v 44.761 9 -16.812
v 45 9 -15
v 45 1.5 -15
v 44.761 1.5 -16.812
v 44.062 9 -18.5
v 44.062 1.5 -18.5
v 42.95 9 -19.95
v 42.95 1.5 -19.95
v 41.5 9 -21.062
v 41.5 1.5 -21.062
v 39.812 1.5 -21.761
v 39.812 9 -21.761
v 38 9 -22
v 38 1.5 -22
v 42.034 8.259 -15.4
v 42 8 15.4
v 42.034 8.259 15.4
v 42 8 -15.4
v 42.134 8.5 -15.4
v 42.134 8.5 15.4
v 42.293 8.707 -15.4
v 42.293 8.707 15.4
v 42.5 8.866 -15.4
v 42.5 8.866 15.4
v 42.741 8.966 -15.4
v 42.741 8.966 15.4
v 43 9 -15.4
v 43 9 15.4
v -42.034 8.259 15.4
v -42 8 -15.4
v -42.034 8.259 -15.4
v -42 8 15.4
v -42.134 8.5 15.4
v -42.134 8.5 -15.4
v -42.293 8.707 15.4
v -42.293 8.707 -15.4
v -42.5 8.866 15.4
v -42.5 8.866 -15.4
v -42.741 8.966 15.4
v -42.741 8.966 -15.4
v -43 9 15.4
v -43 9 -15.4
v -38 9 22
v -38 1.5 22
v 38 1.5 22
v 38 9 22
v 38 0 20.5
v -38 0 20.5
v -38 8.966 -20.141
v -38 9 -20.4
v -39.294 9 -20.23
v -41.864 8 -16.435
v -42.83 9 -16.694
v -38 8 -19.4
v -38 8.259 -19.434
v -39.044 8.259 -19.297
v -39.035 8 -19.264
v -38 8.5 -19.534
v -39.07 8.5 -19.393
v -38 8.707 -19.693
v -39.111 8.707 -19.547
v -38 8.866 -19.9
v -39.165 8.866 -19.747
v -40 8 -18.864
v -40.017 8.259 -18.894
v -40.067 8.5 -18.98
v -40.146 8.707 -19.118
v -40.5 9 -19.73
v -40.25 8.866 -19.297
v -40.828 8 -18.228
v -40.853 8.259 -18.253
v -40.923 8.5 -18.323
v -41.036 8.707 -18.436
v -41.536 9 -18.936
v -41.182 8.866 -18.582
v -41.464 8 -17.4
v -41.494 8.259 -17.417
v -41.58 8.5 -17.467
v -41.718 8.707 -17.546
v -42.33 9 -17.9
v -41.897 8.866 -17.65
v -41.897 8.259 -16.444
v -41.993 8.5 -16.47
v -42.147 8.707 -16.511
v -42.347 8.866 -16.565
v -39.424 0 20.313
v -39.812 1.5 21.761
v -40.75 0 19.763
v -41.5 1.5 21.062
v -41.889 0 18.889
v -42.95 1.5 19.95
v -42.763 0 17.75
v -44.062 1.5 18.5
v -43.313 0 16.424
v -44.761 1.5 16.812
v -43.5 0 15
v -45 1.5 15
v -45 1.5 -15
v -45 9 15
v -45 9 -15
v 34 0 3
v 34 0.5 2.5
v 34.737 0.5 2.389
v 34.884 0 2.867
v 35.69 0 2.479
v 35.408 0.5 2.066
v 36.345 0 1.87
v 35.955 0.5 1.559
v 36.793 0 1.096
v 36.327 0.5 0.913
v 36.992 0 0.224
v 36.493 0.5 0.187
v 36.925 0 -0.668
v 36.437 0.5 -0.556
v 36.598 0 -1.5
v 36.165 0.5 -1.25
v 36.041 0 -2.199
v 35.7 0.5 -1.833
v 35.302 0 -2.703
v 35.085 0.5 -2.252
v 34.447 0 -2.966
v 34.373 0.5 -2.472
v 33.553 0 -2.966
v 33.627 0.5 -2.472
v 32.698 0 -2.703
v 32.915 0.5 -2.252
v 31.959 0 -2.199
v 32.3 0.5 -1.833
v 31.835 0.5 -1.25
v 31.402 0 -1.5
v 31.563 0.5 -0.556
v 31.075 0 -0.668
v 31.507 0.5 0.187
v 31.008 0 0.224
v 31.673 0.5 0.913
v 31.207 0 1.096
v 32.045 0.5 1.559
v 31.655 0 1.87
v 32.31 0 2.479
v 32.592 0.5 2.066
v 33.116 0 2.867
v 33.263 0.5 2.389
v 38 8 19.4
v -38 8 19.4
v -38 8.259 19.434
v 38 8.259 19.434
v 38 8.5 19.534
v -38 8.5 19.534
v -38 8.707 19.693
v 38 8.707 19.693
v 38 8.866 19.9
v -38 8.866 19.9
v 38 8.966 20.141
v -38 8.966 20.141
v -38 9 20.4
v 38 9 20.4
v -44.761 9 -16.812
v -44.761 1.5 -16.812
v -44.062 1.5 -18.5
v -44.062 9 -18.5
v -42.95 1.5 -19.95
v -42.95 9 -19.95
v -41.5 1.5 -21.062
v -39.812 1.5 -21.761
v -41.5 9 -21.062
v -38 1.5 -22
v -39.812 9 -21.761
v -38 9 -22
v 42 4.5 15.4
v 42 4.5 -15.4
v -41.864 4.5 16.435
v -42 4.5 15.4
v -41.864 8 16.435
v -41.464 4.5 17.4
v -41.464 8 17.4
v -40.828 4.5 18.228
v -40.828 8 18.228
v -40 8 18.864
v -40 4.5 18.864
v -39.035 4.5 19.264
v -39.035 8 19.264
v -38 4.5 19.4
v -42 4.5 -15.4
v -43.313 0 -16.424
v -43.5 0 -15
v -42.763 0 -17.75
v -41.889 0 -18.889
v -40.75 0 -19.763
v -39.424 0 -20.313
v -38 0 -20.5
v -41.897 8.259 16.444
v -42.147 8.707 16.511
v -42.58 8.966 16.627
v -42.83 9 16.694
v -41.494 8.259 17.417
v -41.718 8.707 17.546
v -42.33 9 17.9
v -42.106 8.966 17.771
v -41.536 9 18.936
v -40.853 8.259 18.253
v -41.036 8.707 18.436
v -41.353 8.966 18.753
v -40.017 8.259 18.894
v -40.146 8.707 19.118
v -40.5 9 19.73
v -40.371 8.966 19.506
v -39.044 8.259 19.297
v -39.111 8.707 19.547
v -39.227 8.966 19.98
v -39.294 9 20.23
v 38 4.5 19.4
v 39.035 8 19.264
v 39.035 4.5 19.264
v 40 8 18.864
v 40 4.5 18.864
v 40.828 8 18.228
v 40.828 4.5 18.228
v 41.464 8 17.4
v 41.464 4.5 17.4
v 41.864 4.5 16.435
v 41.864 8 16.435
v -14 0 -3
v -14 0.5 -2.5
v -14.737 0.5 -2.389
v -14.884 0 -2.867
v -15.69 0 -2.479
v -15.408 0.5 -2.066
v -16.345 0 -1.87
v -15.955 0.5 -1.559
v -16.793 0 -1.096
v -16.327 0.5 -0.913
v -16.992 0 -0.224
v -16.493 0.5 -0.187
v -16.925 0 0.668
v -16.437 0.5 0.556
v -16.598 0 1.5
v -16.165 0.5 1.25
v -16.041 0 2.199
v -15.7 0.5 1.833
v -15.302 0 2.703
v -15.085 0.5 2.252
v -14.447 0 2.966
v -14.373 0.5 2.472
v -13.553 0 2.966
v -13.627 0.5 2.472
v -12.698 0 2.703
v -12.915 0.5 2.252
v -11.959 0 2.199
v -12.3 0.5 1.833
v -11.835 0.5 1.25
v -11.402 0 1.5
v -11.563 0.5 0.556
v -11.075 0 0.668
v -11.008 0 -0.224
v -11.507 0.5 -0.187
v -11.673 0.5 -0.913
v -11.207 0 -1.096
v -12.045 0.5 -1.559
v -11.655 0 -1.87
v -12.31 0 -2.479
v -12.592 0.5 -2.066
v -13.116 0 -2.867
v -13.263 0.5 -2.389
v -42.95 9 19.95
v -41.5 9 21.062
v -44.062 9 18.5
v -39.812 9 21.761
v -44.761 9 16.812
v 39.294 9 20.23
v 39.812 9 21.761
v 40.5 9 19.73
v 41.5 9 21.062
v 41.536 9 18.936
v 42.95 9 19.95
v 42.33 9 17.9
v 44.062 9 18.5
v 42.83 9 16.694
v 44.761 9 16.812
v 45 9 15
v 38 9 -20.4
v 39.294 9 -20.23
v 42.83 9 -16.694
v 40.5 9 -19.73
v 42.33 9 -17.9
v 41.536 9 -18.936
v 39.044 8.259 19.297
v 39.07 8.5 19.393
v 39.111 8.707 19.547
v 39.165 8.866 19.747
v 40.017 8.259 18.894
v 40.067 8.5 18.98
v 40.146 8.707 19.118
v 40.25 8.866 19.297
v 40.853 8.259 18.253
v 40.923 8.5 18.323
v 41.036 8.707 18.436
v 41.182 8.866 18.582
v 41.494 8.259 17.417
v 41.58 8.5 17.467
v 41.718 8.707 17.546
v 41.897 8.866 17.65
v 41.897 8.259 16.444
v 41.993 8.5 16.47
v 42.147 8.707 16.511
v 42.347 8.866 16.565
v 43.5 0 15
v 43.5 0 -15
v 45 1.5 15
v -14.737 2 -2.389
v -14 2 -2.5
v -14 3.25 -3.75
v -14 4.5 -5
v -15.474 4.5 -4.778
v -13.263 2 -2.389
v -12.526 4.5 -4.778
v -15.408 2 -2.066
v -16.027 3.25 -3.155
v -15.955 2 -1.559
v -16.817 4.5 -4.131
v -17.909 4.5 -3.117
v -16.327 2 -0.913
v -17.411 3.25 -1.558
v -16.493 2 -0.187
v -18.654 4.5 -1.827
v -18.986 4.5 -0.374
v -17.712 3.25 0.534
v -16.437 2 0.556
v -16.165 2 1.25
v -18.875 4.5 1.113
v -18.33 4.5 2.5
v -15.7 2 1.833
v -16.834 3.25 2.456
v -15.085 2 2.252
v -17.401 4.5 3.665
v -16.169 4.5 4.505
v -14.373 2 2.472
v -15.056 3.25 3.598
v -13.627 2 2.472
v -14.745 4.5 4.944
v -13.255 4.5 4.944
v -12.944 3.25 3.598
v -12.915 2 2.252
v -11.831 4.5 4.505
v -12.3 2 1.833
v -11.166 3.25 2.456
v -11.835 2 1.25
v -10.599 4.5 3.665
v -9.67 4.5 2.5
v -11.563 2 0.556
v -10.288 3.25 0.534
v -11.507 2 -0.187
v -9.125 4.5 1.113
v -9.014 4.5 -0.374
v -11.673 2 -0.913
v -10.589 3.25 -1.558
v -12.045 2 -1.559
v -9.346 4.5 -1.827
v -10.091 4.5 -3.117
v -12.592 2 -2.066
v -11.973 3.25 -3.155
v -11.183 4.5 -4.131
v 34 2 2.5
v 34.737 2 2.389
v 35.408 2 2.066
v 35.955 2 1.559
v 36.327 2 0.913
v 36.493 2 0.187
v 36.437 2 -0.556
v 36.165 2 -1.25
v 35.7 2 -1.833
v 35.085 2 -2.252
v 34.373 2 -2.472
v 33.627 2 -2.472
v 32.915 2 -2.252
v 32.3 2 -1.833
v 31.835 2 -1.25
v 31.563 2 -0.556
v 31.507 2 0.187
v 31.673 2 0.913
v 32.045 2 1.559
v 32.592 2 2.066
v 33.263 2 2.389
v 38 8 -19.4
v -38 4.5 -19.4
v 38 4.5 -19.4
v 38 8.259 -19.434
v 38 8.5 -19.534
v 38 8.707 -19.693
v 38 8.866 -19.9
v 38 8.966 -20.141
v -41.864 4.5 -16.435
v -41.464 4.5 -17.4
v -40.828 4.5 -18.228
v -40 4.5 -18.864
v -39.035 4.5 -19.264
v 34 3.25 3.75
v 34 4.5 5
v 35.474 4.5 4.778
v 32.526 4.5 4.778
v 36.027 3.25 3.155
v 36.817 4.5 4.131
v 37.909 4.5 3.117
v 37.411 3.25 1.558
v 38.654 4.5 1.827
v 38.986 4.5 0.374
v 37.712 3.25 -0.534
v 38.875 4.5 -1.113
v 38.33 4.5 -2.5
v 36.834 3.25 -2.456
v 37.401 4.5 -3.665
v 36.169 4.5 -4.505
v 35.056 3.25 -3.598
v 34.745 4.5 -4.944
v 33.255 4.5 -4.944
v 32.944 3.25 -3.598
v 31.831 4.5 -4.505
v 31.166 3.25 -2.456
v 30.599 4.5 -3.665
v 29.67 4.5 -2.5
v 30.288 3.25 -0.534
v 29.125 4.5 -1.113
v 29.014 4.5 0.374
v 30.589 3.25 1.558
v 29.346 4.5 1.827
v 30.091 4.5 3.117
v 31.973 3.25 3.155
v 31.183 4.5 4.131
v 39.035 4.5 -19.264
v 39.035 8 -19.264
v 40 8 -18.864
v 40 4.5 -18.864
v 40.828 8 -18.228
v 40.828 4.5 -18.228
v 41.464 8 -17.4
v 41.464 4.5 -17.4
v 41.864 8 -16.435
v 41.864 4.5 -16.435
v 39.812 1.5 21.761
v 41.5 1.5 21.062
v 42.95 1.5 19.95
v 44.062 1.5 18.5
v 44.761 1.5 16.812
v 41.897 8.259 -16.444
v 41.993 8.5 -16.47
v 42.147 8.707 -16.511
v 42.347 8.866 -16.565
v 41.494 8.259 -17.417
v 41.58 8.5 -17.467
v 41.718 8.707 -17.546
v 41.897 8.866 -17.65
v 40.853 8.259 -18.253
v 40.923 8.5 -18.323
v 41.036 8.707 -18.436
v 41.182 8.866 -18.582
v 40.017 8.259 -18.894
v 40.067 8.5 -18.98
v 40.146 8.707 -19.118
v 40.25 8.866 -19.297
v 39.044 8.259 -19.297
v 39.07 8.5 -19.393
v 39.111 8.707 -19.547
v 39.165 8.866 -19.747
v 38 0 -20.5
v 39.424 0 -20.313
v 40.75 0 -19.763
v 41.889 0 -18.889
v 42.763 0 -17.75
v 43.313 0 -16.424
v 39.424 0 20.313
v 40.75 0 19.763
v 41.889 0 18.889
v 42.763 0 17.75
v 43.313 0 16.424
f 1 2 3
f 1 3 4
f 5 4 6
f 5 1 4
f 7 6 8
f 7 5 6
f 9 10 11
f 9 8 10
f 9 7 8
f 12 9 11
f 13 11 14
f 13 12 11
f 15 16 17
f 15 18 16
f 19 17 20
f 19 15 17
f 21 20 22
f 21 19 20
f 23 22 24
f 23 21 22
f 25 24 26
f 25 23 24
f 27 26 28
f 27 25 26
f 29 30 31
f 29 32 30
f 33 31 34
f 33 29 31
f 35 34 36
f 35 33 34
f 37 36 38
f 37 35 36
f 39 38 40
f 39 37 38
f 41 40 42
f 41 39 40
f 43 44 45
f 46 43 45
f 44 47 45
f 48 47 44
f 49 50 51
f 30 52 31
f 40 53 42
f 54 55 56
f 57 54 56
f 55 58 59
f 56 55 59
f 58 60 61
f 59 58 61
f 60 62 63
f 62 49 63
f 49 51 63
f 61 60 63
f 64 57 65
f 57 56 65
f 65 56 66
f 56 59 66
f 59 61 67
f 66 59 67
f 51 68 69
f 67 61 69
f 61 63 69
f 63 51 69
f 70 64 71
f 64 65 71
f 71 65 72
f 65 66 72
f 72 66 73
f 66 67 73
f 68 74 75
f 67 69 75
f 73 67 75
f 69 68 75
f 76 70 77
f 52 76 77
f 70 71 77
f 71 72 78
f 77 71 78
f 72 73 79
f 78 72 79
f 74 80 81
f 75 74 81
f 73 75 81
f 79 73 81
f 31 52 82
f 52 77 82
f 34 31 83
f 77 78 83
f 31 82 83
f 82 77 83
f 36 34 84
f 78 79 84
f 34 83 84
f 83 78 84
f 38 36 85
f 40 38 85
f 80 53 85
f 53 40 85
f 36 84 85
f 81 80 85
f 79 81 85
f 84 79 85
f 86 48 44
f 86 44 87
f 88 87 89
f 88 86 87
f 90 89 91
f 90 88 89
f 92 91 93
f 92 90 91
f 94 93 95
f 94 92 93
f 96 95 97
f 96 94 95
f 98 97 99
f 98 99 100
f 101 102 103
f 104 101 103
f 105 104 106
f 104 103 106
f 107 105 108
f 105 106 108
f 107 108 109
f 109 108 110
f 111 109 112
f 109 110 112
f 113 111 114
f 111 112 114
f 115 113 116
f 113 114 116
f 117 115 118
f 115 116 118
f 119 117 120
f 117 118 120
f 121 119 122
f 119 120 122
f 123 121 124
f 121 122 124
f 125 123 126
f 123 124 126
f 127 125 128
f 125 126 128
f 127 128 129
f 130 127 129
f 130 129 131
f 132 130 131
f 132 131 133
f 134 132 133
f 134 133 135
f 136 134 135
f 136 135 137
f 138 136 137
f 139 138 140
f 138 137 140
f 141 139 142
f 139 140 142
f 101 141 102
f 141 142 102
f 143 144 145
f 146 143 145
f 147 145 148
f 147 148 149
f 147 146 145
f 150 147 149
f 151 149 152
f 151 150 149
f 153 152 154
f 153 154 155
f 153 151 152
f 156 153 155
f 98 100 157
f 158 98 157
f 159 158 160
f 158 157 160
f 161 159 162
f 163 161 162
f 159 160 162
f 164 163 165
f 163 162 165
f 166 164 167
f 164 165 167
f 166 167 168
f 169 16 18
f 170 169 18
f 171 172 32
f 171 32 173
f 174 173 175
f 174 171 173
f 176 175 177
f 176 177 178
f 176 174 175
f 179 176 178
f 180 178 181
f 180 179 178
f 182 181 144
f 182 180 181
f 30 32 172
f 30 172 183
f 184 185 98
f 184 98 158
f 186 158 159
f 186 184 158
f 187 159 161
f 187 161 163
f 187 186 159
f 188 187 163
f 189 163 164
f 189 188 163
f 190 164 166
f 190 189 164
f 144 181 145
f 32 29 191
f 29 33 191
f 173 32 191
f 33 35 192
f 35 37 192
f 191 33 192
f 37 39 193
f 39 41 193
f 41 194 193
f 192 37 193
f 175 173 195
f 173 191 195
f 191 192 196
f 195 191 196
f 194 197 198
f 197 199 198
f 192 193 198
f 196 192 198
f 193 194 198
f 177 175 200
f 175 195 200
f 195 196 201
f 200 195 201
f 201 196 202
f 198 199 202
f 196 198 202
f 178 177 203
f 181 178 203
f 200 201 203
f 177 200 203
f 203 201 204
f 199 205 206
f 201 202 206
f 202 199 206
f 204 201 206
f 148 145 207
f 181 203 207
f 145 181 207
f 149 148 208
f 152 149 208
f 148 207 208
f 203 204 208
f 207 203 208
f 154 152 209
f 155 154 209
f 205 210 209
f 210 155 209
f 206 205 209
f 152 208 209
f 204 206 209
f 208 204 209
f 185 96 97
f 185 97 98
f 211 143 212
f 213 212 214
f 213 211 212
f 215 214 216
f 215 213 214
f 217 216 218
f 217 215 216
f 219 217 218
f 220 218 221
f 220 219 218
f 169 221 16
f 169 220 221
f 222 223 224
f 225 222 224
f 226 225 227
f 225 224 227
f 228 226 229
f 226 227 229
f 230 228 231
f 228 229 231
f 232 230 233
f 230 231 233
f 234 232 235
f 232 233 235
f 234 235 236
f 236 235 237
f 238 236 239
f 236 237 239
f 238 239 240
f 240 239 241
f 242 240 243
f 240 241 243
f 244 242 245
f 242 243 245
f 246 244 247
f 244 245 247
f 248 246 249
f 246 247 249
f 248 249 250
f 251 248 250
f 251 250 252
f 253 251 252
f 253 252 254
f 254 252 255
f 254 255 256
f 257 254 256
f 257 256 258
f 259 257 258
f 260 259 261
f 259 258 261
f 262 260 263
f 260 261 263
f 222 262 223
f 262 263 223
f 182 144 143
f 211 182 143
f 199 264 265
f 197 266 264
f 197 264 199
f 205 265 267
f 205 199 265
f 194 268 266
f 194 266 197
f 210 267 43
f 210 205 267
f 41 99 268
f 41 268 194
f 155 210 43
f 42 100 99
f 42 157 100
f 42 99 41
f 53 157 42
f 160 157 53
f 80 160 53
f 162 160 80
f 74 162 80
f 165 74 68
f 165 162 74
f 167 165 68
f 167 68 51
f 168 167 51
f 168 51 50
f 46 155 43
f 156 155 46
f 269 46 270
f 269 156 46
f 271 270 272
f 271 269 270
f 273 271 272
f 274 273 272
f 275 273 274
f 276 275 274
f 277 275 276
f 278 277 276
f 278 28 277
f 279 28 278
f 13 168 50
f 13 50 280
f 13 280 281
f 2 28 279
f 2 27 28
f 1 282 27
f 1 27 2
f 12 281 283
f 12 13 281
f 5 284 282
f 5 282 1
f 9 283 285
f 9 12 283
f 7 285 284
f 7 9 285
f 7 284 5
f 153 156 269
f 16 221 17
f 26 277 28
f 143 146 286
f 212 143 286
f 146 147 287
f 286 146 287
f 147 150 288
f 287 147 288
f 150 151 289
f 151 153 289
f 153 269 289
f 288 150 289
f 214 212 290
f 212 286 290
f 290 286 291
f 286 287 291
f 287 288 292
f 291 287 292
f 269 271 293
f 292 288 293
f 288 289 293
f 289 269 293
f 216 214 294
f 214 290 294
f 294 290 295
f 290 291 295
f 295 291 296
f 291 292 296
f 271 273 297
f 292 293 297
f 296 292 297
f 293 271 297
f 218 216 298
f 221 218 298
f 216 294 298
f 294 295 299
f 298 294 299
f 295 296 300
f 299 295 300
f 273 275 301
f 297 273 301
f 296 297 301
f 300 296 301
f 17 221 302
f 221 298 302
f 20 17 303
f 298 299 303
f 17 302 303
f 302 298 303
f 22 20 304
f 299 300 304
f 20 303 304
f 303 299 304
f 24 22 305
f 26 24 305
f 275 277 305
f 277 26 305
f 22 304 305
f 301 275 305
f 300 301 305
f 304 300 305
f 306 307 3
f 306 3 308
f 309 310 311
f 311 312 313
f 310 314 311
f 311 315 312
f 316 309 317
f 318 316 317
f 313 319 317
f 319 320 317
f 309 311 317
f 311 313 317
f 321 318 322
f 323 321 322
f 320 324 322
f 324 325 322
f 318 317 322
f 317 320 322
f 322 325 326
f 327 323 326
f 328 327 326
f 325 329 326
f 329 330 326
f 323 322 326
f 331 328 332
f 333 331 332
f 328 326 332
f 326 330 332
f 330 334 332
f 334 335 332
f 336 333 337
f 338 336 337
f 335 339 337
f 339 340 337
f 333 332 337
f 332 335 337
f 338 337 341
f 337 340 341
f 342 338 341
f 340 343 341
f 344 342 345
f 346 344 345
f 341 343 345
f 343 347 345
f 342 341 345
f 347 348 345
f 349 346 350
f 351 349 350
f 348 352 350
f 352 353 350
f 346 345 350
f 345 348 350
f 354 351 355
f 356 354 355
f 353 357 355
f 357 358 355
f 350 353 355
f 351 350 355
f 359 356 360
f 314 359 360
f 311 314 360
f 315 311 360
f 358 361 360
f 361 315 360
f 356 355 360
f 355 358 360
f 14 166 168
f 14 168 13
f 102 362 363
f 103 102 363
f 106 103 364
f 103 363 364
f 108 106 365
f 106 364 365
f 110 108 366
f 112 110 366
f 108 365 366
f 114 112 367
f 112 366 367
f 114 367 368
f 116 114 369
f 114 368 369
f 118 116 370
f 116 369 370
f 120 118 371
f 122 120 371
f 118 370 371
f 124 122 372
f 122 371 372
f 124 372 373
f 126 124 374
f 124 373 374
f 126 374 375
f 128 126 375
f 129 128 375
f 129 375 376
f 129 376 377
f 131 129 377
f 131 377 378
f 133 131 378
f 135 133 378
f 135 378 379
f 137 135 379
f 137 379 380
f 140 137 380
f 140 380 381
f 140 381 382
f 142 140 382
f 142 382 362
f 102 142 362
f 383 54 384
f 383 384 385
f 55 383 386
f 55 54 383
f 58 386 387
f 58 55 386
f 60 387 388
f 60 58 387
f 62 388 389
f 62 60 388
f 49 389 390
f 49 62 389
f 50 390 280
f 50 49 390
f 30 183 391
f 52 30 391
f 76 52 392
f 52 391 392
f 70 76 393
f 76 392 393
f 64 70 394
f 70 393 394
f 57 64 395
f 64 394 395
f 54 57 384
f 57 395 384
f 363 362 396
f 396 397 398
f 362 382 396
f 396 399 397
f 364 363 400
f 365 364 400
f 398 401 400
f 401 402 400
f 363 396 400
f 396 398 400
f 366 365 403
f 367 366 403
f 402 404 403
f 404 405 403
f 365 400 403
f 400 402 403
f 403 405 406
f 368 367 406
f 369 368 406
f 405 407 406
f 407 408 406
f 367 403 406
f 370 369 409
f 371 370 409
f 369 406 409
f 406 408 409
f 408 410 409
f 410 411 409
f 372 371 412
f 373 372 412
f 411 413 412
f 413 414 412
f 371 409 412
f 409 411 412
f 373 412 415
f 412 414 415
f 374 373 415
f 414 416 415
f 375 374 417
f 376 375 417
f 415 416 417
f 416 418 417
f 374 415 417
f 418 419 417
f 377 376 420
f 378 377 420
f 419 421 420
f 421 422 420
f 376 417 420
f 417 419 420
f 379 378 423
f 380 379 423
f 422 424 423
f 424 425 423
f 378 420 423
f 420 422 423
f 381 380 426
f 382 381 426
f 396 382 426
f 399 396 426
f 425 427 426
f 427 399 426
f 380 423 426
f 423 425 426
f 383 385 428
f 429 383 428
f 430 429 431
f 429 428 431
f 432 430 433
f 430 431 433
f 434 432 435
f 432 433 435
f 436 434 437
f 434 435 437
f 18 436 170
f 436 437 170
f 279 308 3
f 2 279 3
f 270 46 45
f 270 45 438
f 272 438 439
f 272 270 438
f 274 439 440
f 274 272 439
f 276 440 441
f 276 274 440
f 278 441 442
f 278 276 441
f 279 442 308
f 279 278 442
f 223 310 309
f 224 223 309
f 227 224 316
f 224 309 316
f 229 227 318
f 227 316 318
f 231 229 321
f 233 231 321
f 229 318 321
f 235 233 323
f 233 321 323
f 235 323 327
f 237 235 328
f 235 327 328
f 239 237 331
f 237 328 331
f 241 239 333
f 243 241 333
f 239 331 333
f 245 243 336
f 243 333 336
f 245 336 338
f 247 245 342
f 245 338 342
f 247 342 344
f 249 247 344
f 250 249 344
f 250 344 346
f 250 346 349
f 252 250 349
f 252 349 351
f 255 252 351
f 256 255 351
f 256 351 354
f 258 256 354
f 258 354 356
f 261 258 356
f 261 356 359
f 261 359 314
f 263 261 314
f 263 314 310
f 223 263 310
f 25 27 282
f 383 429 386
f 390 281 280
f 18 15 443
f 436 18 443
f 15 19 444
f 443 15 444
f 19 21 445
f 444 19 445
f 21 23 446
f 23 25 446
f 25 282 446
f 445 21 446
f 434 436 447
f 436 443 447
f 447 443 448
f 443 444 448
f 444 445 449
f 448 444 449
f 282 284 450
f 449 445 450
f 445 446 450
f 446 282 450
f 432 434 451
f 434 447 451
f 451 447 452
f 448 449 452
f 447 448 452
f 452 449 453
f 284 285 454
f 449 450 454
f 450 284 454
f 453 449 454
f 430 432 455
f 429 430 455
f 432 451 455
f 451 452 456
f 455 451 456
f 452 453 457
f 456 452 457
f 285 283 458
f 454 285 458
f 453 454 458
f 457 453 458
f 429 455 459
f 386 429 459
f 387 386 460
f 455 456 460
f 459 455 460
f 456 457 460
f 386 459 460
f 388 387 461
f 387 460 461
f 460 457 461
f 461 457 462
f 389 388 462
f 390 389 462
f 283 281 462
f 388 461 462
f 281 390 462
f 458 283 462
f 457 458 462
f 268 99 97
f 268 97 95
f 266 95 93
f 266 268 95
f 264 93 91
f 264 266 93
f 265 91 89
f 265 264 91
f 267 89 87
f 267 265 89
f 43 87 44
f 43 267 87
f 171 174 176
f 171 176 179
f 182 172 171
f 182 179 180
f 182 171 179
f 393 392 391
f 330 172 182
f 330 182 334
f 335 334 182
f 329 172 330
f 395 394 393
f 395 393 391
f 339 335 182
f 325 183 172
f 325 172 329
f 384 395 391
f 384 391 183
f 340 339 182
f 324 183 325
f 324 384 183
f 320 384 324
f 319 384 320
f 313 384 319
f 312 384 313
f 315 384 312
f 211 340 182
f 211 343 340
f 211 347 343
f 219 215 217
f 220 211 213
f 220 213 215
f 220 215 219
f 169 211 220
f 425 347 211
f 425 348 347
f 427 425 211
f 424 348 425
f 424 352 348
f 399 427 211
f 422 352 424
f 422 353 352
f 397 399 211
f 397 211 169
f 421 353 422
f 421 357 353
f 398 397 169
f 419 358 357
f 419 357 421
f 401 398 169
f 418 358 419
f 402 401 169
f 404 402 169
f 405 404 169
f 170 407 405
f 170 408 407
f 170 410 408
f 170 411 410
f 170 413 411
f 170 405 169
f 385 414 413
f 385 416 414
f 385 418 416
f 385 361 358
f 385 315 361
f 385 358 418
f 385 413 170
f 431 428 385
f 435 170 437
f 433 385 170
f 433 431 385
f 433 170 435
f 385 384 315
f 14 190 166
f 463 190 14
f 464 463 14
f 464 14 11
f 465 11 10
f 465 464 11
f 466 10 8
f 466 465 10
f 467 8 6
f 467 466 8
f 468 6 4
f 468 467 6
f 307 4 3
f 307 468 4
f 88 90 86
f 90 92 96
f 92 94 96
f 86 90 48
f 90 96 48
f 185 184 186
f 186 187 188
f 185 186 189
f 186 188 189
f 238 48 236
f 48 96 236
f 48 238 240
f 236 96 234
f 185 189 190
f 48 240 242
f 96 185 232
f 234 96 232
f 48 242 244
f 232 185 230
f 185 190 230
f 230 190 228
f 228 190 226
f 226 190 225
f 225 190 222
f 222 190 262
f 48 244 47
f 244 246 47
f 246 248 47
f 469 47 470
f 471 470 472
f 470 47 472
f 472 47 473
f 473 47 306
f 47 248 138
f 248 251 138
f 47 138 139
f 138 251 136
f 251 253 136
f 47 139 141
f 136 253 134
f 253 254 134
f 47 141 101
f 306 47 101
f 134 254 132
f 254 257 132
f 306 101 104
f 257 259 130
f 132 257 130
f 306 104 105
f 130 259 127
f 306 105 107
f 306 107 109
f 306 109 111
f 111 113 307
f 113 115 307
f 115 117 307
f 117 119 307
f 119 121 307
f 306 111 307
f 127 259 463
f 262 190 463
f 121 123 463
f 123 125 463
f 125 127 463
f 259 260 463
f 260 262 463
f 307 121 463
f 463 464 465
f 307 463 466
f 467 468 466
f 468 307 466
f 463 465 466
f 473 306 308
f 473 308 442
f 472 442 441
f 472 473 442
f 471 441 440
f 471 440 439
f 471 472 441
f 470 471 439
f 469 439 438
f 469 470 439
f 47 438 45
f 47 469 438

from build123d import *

# Parameters (mm, degrees)
SKETCH_1_W          = 90
SKETCH_1_H          = 44
EXTRUDE_1_DEPTH     = 9
FILLET_1_R          = 7
SKETCH_2_W          = 84
SKETCH_2_H          = 38.8
CUT_EXTRUDE_1_DEPTH = 4.5
SKETCH_3_R          = 2.5
CUT_EXTRUDE_2_DEPTH = 10
CHAMFER_1_SIZE      = 2.5
FILLET_2_R          = 4
FILLET_3_R          = 1
CHAMFER_4_SIZE      = 1.5
CHAMFER_2_SIZE      = 0.5


with BuildPart() as part:
    # Эскиз1 → Бобышка-Вытянуть1 (new body)
    with BuildSketch(Plane(origin=(0, 0, 0), x_dir=(1, 0, 0), z_dir=(0, 1, 0))):
        Rectangle(SKETCH_1_W, SKETCH_1_H)
    extrude(amount=EXTRUDE_1_DEPTH)

    # Скругление1
    fillet_1_edges = [part.edges().sort_by_distance(p)[0] for p in [
        (45, 4.5, 22),
        (-45, 4.5, 22),
        (-45, 4.5, -22),
        (45, 4.5, -22),
    ]]
    fillet(fillet_1_edges, radius=FILLET_1_R)

    # Эскиз2 → Вырез-Вытянуть1 (cut)
    with BuildSketch(Plane(origin=(0, 9, 0), x_dir=(1, 0, 0), z_dir=(0, 1, 0))):
        Rectangle(SKETCH_2_W, SKETCH_2_H)
    extrude(amount=-CUT_EXTRUDE_1_DEPTH, mode=Mode.SUBTRACT)

    # Эскиз3 → Вырез-Вытянуть2 (cut)
    with BuildSketch(Plane(origin=(0, 4.5, 0), x_dir=(1, 0, 0), z_dir=(0, 1, 0))):
        with Locations(Location((34, 0, 0), (0, 0, 270))):
            Circle(SKETCH_3_R)
        with Locations(Location((-14, 0, 0), (0, 0, 90))):
            Circle(SKETCH_3_R)
    extrude(amount=-CUT_EXTRUDE_2_DEPTH, mode=Mode.SUBTRACT)

    # Фаска1
    chamfer_1_edges = [part.edges().sort_by_distance(p)[0] for p in [
        (34, 4.5, -2.5),
        (-14, 4.5, 2.5),
    ]]
    chamfer(chamfer_1_edges, length=CHAMFER_1_SIZE)

    # Скругление2
    fillet_2_edges = [part.edges().sort_by_distance(p)[0] for p in [
        (42, 6.75, -19.4),
        (42, 6.75, 19.4),
        (-42, 6.75, 19.4),
        (-42, 6.75, -19.4),
    ]]
    fillet(fillet_2_edges, radius=FILLET_2_R)

    # Скругление3
    fillet_3_edges = [part.edges().sort_by_distance(p)[0] for p in [
        (0, 9, 19.4),
        (-42, 9, 0),
        (42, 9, 0),
        (0, 9, -19.4),
        (-40.828427125, 9, 18.228427125),
        (40.828427125, 9, 18.228427125),
        (40.828427125, 9, -18.228427125),
        (-40.828427125, 9, -18.228427125),
    ]]
    fillet(fillet_3_edges, radius=FILLET_3_R)

    # Chamfer 4
    chamfer_4_edges = [part.edges().sort_by_distance(p)[0] for p in [
        (-45, 0, 0),
        (45, 0, 0),
        (0, 0, 22),
        (0, 0, -22),
        (42.949747468, 0, 19.949747468),
        (42.949747468, 0, -19.949747468),
        (-42.949747468, 0, 19.949747468),
        (-42.949747468, 0, -19.949747468),
    ]]
    chamfer(chamfer_4_edges, length=CHAMFER_4_SIZE)

    # Фаска2
    chamfer_2_edges = [part.edges().sort_by_distance(p)[0] for p in [
        (34, 0, -2.5),
        (-14, 0, 2.5),
    ]]
    chamfer(chamfer_2_edges, length=CHAMFER_2_SIZE)


solid = part.part
